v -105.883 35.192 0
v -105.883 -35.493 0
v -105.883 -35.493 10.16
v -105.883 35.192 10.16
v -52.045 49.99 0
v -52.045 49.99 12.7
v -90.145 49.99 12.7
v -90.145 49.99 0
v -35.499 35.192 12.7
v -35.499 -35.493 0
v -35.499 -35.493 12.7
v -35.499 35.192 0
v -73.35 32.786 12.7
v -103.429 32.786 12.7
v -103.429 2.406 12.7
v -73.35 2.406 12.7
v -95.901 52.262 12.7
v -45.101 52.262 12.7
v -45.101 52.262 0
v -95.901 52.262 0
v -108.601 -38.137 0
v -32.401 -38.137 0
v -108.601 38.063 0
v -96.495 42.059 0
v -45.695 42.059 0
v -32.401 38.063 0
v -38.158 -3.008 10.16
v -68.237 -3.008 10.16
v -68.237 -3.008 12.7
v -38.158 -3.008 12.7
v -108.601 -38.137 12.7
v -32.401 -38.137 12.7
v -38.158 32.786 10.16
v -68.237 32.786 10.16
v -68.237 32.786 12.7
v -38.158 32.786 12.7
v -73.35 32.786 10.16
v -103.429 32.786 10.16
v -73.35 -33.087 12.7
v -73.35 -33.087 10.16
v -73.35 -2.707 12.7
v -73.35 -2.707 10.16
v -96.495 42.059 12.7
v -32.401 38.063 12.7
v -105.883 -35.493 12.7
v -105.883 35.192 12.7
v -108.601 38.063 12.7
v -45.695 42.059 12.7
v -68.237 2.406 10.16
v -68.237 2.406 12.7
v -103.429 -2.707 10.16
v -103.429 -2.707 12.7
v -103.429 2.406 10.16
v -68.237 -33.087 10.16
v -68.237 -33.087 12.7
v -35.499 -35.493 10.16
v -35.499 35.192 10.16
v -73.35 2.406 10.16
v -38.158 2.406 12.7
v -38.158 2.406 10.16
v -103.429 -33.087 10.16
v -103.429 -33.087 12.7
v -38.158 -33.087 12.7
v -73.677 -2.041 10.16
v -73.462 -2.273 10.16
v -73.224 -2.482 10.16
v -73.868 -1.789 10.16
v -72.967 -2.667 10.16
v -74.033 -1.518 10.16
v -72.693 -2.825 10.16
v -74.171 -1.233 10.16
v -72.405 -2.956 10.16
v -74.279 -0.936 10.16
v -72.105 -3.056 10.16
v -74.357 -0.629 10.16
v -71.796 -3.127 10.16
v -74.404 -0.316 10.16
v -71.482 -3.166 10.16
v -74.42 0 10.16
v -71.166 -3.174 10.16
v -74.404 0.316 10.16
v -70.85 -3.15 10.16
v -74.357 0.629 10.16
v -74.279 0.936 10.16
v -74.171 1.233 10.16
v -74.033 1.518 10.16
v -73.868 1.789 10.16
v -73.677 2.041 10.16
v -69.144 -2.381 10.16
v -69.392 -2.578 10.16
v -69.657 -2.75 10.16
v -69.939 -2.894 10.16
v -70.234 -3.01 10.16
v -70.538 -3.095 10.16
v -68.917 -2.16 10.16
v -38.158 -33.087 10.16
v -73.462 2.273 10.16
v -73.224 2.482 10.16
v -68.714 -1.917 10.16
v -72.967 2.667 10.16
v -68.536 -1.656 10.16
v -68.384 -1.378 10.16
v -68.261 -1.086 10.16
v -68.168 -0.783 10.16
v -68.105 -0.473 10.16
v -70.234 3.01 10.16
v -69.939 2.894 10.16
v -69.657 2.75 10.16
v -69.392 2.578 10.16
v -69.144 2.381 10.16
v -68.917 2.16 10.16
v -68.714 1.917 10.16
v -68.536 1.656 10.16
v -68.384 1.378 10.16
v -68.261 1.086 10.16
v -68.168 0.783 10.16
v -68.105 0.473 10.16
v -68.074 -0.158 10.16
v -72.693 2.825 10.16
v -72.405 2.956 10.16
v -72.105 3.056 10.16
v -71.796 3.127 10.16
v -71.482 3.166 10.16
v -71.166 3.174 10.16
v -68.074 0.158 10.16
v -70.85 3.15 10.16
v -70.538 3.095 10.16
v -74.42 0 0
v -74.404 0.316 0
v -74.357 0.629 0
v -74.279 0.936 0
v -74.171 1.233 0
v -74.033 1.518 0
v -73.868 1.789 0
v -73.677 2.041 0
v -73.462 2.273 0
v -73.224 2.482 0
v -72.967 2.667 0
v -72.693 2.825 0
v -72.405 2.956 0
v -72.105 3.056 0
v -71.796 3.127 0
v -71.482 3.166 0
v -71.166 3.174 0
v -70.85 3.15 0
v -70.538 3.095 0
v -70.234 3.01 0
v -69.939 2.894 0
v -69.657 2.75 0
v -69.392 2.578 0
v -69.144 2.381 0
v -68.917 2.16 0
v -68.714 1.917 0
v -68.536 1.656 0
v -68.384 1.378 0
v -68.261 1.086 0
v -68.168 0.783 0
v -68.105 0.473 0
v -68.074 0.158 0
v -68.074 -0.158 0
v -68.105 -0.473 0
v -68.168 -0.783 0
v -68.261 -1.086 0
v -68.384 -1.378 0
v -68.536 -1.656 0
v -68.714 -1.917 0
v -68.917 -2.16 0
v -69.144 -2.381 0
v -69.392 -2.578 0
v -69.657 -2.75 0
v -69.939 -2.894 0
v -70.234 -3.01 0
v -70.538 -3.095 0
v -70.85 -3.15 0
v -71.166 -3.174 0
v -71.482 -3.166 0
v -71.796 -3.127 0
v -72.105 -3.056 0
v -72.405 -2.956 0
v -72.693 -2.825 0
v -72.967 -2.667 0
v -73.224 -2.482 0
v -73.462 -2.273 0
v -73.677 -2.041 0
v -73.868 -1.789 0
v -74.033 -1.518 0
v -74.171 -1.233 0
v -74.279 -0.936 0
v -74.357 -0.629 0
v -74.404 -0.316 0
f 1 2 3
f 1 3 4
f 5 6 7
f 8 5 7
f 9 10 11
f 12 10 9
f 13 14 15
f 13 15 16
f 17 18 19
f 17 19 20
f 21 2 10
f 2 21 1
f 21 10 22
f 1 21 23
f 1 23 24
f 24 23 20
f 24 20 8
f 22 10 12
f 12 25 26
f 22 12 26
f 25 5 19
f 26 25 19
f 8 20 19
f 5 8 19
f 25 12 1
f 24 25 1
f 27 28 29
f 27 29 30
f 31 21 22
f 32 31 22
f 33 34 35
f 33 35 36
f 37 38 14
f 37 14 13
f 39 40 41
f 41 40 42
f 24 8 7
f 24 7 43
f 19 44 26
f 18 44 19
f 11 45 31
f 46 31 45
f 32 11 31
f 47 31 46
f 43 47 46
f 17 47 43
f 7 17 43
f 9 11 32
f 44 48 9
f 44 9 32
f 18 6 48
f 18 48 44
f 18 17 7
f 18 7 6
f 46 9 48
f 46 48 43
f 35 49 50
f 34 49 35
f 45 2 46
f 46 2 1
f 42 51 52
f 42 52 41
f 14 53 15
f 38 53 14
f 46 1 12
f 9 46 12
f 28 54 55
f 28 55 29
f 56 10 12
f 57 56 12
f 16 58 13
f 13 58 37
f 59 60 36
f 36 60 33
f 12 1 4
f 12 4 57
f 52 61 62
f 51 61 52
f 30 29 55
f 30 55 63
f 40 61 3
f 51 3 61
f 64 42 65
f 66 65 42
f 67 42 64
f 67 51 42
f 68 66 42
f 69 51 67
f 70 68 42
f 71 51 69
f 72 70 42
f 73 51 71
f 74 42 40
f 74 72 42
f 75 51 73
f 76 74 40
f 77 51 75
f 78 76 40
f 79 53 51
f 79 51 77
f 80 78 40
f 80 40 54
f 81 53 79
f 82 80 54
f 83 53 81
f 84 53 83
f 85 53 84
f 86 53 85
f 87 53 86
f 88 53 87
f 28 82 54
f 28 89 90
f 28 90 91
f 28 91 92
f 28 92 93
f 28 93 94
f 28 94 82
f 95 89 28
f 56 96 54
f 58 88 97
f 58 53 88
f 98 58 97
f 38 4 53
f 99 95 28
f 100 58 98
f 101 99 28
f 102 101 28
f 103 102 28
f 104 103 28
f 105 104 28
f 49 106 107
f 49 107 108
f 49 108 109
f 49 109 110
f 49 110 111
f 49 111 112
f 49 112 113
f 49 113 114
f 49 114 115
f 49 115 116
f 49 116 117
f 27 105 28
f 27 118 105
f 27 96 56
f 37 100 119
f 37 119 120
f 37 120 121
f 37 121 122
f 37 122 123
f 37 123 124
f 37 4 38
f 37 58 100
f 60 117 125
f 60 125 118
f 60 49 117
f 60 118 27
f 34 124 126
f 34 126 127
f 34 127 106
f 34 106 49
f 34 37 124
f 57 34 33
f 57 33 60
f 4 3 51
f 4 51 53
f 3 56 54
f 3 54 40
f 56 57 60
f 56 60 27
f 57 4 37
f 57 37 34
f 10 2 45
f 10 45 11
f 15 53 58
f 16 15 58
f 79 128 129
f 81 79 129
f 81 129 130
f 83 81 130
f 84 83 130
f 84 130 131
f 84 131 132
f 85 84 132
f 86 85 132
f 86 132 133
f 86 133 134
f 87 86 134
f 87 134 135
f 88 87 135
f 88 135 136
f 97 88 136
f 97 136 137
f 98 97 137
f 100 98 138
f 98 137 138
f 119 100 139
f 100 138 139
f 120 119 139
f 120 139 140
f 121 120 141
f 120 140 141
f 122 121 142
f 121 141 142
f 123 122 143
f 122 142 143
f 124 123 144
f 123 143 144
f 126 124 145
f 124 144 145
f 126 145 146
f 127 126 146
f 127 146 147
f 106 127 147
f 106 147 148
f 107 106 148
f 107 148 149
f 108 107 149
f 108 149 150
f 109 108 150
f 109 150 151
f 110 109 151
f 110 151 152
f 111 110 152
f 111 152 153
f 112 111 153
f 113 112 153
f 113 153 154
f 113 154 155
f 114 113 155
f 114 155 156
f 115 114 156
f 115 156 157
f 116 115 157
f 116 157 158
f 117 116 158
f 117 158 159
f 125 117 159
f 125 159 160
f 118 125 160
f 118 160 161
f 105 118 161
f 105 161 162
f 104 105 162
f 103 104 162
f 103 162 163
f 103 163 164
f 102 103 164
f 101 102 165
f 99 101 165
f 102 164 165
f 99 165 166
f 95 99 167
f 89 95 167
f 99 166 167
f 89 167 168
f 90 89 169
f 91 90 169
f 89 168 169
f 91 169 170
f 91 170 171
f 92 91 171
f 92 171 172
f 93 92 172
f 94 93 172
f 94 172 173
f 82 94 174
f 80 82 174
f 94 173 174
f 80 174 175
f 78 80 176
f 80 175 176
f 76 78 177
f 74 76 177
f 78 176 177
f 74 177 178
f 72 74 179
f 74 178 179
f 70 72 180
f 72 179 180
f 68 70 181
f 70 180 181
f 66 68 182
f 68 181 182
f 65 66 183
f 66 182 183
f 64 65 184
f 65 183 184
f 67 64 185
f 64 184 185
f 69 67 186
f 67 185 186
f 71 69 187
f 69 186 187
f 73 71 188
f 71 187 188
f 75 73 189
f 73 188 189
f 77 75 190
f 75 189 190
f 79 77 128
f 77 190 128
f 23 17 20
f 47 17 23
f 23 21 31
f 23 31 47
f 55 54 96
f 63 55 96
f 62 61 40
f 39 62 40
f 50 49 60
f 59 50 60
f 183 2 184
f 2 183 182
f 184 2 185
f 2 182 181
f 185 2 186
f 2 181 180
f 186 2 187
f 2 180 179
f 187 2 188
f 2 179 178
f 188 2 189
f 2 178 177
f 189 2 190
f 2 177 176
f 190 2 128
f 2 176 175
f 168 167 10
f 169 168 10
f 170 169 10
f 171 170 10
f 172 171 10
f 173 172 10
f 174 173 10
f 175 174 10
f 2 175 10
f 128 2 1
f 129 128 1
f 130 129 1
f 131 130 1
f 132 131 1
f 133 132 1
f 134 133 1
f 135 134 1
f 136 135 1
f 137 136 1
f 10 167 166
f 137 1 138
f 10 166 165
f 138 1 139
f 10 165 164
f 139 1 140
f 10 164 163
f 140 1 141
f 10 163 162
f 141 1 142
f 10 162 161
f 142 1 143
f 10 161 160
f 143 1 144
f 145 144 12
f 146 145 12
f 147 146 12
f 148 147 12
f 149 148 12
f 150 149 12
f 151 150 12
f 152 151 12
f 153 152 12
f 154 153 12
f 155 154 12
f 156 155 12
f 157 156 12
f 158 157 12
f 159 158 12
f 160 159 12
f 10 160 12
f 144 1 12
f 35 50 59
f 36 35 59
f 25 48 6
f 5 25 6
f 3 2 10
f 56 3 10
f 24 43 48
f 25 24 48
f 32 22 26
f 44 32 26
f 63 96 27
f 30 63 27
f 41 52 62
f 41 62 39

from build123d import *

# Parameters (mm, degrees)
F0_W      = 76.2
F0_H      = 76.2
F0_W_2    = 70.384737
F0_H_2    = 70.685525
F1_DEPTH  = 12.7
F2_DEPTH  = 10.16
F3_W      = 30.078948
F3_H      = 30.379737
F3_H_2    = 30.379739
F3_W_2    = 30.078947
F3_H_3    = 30.078949
F4_DEPTH  = 2.54
F6_D      = 6.35
F9_DEPTH  = 12.7
F10_DEPTH = 12.701


with BuildPart() as f1:
    # F0 (on Top) → F1 (new body)
    with BuildSketch(Plane.XY):
        with Locations((-70.500866, -0.037277)):
            Rectangle(F0_W, F0_H)
        with Locations((-70.691103, -0.150396)):
            Rectangle(F0_W_2, F0_H_2, mode=Mode.SUBTRACT)
    extrude(amount=F1_DEPTH)

    # F7 (on face) → F9 (join)
    with BuildSketch(Plane.XY.offset(12.7)):
        Polygon((-95.900866, 52.261754), (-108.600866, 38.062723), (-32.400866, 38.062723), (-45.100866, 52.261754), align=None)
    extrude(amount=-F9_DEPTH)

    # F8 (on face) → F10 (cut, through all)
    with BuildSketch(Plane.XY.offset(12.7)):
        Polygon((-90.144515, 49.989733), (-96.494515, 42.058586), (-45.694515, 42.058586), (-52.044515, 49.989733), align=None)
    extrude(amount=-F10_DEPTH, mode=Mode.SUBTRACT)


with BuildPart() as f2:
    # F0 (on Top) → F2 (new body)
    with BuildSketch(Plane.XY):
        with Locations((-70.691103, -0.150396)):
            Rectangle(F0_W_2, F0_H_2)
    extrude(amount=F2_DEPTH)

    # F3 (on face) → F4 (join)
    with BuildSketch(Plane.XY.offset(10.16)):
        with Locations((-88.389911, 17.596184)):
            Rectangle(F3_W, F3_H)
        with Locations((-88.389911, -17.896974)):
            Rectangle(F3_W, F3_H_2)
        with Locations((-53.197541, -18.047369)):
            Rectangle(F3_W_2, F3_H_3)
        with Locations((-53.197541, 17.596184)):
            Rectangle(F3_W_2, F3_H)
    extrude(amount=F4_DEPTH)

    # F6 (through all)
    with Locations(Plane.XY.offset(10.16)):
        with Locations((-71.24491, 0)):
            Hole(F6_D / 2)


solid = Compound([f1.part, f2.part])
